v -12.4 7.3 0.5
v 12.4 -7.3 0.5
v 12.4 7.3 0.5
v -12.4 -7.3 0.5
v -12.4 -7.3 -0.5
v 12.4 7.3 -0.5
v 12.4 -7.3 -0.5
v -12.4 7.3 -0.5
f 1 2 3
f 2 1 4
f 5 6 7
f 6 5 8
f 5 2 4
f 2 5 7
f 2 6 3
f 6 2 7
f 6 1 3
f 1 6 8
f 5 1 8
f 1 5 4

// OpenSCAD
// PCB parameters (mm)
length    = 24.8;   // X
width     = 14.6;   // Y
thickness = 1.0;    // Z

$fn = 64;

// Single connected solid: PCB slab, centered at origin for reliable visibility
module PCB(l=length, w=width, t=thickness) {
    color([0.0, 0.4, 0.2])
        cube([l, w, t], center=true);
}

PCB();
